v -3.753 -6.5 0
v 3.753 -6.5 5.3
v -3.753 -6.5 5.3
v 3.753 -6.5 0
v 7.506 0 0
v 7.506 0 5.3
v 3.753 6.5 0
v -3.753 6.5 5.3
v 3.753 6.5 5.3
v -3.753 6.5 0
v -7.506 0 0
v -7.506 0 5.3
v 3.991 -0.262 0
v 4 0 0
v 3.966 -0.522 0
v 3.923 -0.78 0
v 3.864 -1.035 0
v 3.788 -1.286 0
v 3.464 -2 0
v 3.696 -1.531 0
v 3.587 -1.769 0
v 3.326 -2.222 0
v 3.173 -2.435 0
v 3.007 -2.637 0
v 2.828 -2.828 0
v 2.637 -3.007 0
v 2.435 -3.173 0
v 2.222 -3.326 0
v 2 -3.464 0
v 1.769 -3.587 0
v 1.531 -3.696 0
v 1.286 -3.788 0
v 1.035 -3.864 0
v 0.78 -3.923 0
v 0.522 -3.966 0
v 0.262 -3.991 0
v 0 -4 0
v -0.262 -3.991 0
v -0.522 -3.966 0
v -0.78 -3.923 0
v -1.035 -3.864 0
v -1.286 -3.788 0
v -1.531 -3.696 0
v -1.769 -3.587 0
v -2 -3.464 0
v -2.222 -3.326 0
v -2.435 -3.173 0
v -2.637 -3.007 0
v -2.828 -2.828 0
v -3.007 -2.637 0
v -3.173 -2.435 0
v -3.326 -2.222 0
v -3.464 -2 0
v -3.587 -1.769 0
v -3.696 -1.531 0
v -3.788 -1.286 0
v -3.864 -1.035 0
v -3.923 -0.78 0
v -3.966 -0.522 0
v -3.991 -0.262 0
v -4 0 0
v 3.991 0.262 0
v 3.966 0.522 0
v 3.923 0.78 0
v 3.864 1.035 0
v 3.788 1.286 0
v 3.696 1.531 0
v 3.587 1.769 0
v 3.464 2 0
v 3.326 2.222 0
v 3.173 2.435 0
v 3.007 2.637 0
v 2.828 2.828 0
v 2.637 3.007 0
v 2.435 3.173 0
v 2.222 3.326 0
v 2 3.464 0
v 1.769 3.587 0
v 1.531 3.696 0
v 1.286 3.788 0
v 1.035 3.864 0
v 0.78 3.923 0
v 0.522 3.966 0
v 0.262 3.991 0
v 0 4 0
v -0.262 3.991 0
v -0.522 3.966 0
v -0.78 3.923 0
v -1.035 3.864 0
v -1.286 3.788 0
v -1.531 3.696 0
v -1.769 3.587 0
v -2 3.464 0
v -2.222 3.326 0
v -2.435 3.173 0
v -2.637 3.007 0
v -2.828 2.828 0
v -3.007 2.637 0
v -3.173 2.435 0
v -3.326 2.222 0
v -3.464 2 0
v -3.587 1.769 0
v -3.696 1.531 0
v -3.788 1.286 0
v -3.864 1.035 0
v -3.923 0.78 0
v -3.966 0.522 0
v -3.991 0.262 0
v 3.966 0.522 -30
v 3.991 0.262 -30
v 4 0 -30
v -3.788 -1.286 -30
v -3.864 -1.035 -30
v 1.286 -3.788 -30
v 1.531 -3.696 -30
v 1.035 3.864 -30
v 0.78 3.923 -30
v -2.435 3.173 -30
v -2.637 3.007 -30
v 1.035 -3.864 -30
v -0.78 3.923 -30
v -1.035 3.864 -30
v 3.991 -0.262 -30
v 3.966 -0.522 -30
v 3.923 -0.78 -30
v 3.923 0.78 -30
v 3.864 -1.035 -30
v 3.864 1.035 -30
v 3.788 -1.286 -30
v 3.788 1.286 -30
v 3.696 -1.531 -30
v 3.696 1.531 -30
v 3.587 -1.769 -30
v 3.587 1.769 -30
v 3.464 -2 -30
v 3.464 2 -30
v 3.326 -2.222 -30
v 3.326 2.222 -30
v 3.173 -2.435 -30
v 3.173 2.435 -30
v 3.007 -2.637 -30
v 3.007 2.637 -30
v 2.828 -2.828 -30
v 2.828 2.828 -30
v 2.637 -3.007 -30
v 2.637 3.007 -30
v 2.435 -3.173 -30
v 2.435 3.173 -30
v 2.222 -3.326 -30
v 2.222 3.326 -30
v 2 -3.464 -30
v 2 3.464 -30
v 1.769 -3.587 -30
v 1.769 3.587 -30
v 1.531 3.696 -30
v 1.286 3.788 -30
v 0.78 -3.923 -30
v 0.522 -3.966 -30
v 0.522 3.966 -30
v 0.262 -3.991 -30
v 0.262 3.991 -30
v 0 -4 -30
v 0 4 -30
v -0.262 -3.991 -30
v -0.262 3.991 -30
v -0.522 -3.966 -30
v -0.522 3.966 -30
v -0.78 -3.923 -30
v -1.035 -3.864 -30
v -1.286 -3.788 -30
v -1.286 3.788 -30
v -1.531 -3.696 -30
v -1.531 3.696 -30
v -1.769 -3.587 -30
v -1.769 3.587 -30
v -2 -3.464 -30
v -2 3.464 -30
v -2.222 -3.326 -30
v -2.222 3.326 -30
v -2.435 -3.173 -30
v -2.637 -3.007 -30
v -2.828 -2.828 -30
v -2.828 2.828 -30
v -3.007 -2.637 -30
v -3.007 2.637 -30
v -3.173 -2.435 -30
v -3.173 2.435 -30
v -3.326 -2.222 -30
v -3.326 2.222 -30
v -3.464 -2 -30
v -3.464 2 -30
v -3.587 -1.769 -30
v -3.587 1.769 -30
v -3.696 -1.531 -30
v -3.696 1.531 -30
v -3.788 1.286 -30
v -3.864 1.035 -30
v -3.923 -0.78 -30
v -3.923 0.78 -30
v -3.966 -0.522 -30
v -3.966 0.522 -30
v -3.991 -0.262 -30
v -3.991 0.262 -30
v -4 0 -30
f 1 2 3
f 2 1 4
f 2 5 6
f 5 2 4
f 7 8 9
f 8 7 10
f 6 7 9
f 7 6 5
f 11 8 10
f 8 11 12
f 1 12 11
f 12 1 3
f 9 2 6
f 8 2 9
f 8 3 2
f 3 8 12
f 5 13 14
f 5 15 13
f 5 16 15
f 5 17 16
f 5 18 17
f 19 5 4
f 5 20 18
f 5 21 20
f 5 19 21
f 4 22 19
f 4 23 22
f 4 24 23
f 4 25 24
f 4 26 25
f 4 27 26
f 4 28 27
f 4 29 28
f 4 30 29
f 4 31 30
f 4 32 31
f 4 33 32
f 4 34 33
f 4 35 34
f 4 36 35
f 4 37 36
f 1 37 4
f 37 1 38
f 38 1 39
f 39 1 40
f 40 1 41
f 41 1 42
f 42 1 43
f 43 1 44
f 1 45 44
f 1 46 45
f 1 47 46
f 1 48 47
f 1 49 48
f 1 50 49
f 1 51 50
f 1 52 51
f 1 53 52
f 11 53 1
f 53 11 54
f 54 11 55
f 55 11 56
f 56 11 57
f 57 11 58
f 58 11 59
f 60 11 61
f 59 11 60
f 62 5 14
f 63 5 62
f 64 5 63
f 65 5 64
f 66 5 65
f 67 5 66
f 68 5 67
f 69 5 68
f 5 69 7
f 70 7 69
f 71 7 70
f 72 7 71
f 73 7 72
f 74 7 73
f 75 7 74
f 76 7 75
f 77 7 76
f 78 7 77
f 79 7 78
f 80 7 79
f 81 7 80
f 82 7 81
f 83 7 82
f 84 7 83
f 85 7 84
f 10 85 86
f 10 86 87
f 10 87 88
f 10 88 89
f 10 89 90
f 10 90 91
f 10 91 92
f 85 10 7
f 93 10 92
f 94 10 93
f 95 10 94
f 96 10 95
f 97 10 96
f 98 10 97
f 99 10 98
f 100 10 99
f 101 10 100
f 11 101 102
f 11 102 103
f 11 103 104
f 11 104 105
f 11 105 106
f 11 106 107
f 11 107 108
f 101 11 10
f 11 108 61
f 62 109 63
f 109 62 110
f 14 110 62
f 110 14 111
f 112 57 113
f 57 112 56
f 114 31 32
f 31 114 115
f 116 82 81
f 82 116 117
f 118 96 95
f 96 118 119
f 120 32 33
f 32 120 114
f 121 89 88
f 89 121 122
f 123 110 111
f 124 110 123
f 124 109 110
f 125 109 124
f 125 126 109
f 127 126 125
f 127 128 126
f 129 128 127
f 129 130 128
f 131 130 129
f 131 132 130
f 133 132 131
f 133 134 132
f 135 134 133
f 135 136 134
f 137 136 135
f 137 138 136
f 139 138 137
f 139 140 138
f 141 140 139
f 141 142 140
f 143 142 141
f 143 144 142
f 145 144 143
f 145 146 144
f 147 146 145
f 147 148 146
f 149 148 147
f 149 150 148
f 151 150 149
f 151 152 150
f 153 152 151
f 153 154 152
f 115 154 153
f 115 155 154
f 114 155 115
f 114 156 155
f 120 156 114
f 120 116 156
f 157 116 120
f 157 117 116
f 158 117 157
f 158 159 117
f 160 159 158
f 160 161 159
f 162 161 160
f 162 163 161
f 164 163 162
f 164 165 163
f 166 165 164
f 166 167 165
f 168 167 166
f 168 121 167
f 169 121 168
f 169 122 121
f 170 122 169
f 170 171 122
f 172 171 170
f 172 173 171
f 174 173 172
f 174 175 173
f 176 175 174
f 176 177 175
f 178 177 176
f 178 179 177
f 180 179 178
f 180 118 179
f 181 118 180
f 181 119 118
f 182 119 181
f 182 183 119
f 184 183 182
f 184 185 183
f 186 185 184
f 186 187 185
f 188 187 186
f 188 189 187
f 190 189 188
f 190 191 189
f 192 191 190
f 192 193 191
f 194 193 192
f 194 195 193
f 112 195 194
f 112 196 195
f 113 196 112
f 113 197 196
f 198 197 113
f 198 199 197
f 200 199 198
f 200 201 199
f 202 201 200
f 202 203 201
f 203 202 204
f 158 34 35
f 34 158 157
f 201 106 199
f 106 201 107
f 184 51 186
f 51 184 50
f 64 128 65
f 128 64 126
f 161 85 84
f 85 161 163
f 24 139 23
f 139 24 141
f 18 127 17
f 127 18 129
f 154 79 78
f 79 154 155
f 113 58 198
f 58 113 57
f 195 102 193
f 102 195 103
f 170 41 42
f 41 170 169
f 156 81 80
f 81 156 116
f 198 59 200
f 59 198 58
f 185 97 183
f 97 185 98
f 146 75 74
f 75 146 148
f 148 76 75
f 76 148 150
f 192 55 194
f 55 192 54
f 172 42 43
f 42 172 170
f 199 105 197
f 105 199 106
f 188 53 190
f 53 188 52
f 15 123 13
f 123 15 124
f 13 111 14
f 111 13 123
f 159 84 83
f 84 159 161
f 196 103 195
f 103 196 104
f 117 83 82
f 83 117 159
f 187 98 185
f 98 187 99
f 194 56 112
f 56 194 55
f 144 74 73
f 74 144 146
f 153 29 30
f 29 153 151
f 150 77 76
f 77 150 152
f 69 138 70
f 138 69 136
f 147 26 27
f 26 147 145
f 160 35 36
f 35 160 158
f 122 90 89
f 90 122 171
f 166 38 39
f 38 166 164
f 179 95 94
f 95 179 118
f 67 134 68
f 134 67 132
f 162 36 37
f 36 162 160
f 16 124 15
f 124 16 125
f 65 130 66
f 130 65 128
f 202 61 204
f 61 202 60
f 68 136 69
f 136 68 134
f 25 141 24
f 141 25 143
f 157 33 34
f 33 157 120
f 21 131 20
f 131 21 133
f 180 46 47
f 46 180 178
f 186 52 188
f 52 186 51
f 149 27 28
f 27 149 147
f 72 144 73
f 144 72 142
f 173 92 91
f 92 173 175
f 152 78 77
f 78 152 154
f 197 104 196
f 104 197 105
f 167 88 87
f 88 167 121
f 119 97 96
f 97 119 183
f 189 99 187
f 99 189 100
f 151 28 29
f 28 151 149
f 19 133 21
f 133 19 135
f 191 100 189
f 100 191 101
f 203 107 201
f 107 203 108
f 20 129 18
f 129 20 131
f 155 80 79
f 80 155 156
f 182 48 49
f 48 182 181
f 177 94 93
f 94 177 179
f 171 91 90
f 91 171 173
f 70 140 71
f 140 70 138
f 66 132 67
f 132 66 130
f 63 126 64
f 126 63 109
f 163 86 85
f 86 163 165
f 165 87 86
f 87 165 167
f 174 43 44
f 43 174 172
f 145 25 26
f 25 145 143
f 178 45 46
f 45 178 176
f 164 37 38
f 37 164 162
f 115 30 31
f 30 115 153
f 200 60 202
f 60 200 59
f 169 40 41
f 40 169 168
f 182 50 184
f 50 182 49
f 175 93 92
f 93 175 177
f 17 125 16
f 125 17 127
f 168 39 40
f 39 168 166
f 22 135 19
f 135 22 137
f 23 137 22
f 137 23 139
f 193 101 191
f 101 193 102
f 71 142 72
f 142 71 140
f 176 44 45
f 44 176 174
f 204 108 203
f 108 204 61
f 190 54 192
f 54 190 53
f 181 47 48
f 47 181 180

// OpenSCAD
// M8 Hex Bolt (simplified, no threads)
// Units: mm

across_flats = 13;   // Head across-flats
head_height  = 5.3;  // Head height
shank_diam   = 8;    // Shank diameter
shank_len    = 30;   // Shank length

function circ_d_from_af(af) = 2 * af / sqrt(3);

module hex_head(af, h) {
    // Hex head: bottom at z=0, top at z=h
    cylinder(d = circ_d_from_af(af), h = h, $fn = 6);
}

module shank(d, len) {
    // Shank: extends from z=-len to z=0
    translate([0, 0, -len])
        cylinder(d = d, h = len, $fn = 96);
}

union() {
    hex_head(across_flats, head_height);
    shank(shank_diam, shank_len);
}
